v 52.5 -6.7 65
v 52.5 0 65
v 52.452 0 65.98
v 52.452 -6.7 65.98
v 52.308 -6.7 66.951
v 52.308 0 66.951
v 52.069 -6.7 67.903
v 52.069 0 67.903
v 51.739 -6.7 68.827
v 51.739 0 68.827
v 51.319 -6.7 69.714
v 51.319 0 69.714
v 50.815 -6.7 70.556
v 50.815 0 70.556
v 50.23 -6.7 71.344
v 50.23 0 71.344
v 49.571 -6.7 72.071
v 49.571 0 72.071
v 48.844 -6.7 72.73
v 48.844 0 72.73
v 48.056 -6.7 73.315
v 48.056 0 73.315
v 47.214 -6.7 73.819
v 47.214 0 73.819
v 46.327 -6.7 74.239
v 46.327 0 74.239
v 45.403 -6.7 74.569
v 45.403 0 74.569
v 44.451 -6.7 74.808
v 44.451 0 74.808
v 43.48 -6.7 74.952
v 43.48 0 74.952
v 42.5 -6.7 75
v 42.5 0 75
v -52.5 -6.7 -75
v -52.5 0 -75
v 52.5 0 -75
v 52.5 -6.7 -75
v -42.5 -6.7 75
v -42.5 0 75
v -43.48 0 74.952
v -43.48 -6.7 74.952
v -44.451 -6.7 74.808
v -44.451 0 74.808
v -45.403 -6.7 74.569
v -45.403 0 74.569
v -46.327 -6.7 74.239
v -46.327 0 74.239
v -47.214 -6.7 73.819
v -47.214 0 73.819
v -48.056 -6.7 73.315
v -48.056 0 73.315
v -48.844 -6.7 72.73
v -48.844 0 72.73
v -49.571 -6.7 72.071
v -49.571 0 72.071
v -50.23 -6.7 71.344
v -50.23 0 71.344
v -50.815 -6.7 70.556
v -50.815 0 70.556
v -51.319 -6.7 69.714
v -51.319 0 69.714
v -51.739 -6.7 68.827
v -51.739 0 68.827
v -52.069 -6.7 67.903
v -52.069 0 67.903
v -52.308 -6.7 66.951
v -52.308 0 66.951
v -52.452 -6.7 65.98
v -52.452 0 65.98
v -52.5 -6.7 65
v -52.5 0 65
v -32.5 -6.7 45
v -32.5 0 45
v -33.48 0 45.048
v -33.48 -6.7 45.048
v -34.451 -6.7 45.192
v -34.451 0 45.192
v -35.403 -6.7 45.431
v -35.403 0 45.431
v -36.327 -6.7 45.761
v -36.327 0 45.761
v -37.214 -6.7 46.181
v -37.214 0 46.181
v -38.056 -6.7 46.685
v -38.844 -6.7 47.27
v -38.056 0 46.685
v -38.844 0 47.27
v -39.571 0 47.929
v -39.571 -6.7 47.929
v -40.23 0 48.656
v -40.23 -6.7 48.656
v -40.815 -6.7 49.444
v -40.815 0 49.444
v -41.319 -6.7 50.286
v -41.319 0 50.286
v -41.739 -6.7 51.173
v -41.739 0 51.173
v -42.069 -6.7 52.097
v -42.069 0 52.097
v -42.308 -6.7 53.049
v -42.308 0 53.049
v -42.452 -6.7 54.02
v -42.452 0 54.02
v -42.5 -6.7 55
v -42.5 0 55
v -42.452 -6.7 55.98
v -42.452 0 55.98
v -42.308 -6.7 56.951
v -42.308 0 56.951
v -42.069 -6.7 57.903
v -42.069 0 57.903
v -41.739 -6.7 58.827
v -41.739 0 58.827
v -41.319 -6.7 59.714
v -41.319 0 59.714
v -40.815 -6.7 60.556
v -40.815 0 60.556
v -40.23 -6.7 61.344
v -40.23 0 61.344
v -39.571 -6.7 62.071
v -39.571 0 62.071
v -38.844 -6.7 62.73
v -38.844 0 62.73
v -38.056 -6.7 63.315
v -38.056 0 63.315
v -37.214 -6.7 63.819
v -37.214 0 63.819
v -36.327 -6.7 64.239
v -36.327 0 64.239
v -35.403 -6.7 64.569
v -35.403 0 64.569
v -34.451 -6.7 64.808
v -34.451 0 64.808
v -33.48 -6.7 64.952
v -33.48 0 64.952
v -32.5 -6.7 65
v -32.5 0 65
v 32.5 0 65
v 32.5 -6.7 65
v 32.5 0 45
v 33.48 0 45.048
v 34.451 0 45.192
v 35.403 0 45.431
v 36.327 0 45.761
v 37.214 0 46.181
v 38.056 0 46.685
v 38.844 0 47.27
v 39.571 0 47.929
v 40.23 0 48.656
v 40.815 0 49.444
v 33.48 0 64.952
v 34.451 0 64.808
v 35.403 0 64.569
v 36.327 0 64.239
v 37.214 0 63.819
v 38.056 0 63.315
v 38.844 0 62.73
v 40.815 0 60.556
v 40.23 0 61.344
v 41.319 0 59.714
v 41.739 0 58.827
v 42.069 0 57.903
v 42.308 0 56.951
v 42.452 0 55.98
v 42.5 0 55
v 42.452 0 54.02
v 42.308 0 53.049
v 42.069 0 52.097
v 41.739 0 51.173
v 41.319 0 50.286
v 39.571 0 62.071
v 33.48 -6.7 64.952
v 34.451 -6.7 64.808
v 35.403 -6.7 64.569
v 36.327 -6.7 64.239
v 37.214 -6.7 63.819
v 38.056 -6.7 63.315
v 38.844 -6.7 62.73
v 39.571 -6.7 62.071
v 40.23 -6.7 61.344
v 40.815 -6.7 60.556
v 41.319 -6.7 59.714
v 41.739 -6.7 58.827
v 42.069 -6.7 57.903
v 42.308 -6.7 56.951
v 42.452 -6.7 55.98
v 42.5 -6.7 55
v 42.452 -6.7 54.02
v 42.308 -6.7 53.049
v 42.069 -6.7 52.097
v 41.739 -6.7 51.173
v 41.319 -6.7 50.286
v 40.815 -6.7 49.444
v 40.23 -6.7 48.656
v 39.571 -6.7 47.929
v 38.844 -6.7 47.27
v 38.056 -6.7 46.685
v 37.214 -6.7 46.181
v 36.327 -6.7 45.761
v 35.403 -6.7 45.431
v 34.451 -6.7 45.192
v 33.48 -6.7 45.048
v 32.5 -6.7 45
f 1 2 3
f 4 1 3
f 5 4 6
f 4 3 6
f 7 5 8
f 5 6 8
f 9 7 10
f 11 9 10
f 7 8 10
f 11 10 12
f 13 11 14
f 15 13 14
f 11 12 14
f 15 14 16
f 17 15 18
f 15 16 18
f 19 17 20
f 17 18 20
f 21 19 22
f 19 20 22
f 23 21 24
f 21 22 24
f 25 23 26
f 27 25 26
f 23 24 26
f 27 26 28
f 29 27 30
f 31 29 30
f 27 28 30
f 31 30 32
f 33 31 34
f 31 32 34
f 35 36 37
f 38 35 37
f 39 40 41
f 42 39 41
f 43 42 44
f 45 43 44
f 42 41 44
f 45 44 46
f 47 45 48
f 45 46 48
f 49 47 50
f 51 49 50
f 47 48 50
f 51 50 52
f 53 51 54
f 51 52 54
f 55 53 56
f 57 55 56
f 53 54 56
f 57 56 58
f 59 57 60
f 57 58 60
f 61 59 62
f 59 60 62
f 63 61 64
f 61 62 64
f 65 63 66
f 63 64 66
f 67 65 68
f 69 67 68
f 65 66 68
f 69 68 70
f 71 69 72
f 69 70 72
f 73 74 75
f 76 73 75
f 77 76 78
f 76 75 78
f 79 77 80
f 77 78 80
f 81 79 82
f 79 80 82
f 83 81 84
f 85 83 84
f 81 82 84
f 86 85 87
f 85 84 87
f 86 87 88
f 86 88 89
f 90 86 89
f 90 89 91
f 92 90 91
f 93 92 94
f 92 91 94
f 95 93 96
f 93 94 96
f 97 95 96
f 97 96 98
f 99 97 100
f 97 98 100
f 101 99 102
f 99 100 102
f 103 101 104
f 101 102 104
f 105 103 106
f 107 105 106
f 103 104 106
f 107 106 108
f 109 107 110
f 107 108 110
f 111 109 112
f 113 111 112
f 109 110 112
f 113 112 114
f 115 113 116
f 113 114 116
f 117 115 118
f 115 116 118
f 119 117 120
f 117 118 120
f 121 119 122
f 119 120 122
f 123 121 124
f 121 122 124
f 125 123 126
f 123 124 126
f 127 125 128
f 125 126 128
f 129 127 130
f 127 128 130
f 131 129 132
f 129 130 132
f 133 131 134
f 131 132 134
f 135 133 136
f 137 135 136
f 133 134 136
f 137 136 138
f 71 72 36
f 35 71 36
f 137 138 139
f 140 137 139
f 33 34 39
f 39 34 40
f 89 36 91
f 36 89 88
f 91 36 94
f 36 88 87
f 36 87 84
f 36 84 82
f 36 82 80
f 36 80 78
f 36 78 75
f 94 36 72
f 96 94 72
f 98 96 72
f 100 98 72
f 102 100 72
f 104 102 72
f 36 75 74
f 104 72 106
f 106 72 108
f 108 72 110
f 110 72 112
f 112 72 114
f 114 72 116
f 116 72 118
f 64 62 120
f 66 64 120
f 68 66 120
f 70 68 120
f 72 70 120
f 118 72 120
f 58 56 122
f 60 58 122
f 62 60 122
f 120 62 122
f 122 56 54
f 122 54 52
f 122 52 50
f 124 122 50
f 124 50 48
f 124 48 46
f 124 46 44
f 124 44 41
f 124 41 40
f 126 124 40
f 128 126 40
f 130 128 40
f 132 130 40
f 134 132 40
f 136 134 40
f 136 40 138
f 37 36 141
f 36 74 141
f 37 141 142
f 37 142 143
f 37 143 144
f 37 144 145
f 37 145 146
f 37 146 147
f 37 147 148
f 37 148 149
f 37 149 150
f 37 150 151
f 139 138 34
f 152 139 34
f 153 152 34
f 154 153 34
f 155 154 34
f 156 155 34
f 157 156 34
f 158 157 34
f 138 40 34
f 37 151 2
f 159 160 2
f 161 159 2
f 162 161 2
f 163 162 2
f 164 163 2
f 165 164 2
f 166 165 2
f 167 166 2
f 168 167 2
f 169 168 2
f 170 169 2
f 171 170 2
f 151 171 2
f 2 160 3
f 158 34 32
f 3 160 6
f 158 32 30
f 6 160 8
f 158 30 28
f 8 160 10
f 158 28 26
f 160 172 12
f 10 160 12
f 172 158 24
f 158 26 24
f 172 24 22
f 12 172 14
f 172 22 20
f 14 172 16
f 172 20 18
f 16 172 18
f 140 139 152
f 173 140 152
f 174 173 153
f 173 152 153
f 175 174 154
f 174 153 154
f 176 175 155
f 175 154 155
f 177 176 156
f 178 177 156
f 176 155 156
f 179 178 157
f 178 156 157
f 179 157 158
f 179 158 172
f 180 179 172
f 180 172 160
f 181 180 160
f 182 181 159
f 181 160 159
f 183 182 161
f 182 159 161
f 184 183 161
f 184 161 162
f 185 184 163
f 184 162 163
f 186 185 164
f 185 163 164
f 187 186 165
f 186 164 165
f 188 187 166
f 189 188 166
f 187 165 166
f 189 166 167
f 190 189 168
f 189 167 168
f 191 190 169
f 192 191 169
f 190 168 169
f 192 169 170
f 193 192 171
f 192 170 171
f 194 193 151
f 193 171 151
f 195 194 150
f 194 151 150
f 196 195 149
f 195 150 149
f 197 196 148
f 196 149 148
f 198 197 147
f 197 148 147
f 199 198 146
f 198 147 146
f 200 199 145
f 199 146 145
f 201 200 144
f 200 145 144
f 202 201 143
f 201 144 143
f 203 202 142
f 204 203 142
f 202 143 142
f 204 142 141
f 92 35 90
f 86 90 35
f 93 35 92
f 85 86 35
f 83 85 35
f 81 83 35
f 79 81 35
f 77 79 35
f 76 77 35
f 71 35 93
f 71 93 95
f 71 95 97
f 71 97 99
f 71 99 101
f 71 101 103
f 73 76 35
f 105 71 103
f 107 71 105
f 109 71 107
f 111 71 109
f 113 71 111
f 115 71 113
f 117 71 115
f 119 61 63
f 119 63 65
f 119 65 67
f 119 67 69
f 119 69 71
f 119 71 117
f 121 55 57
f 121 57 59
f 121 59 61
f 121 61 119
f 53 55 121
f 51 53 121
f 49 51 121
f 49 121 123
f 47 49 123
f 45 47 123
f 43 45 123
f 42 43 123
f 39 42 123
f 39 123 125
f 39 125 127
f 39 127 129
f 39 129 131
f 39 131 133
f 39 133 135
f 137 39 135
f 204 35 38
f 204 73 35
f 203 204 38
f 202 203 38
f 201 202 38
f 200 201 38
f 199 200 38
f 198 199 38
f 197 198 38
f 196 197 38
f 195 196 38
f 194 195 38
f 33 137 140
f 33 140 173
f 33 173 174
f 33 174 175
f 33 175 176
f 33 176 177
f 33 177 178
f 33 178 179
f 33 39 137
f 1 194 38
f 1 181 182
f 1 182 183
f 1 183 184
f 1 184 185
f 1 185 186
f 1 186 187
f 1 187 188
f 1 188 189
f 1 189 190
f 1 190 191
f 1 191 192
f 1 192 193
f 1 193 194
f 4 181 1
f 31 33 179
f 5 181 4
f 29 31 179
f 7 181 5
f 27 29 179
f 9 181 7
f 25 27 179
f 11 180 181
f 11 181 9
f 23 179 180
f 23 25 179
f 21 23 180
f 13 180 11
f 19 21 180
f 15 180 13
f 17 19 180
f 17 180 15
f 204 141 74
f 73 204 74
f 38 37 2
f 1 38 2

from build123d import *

# Parameters (mm, degrees)
F2_DEPTH = 6.7


with BuildPart() as f2:
    # F1 (on Front) → F2 (new body)
    with BuildSketch(Plane.XZ):
        with BuildLine():
            ThreePointArc((52.5, 65), (49.5710678119, 72.0710678119), (42.5, 75))
            Line((42.5, 75), (-42.5, 75))
            ThreePointArc((-42.5, 75), (-49.5710678119, 72.0710678119), (-52.5, 65))
            Line((-52.5, 65), (-52.5, -75))
            Line((-52.5, -75), (52.5, -75))
            Line((52.5, -75), (52.5, 65))
        make_face()
        with BuildLine():
            Line((32.5, 45), (-32.5, 45))
            ThreePointArc((-32.5, 45), (-42.5, 55), (-32.5, 65))
            Line((-32.5, 65), (32.5, 65))
            ThreePointArc((32.5, 65), (42.5, 55), (32.5, 45))
        make_face(mode=Mode.SUBTRACT)
    extrude(amount=F2_DEPTH)


solid = f2.part
